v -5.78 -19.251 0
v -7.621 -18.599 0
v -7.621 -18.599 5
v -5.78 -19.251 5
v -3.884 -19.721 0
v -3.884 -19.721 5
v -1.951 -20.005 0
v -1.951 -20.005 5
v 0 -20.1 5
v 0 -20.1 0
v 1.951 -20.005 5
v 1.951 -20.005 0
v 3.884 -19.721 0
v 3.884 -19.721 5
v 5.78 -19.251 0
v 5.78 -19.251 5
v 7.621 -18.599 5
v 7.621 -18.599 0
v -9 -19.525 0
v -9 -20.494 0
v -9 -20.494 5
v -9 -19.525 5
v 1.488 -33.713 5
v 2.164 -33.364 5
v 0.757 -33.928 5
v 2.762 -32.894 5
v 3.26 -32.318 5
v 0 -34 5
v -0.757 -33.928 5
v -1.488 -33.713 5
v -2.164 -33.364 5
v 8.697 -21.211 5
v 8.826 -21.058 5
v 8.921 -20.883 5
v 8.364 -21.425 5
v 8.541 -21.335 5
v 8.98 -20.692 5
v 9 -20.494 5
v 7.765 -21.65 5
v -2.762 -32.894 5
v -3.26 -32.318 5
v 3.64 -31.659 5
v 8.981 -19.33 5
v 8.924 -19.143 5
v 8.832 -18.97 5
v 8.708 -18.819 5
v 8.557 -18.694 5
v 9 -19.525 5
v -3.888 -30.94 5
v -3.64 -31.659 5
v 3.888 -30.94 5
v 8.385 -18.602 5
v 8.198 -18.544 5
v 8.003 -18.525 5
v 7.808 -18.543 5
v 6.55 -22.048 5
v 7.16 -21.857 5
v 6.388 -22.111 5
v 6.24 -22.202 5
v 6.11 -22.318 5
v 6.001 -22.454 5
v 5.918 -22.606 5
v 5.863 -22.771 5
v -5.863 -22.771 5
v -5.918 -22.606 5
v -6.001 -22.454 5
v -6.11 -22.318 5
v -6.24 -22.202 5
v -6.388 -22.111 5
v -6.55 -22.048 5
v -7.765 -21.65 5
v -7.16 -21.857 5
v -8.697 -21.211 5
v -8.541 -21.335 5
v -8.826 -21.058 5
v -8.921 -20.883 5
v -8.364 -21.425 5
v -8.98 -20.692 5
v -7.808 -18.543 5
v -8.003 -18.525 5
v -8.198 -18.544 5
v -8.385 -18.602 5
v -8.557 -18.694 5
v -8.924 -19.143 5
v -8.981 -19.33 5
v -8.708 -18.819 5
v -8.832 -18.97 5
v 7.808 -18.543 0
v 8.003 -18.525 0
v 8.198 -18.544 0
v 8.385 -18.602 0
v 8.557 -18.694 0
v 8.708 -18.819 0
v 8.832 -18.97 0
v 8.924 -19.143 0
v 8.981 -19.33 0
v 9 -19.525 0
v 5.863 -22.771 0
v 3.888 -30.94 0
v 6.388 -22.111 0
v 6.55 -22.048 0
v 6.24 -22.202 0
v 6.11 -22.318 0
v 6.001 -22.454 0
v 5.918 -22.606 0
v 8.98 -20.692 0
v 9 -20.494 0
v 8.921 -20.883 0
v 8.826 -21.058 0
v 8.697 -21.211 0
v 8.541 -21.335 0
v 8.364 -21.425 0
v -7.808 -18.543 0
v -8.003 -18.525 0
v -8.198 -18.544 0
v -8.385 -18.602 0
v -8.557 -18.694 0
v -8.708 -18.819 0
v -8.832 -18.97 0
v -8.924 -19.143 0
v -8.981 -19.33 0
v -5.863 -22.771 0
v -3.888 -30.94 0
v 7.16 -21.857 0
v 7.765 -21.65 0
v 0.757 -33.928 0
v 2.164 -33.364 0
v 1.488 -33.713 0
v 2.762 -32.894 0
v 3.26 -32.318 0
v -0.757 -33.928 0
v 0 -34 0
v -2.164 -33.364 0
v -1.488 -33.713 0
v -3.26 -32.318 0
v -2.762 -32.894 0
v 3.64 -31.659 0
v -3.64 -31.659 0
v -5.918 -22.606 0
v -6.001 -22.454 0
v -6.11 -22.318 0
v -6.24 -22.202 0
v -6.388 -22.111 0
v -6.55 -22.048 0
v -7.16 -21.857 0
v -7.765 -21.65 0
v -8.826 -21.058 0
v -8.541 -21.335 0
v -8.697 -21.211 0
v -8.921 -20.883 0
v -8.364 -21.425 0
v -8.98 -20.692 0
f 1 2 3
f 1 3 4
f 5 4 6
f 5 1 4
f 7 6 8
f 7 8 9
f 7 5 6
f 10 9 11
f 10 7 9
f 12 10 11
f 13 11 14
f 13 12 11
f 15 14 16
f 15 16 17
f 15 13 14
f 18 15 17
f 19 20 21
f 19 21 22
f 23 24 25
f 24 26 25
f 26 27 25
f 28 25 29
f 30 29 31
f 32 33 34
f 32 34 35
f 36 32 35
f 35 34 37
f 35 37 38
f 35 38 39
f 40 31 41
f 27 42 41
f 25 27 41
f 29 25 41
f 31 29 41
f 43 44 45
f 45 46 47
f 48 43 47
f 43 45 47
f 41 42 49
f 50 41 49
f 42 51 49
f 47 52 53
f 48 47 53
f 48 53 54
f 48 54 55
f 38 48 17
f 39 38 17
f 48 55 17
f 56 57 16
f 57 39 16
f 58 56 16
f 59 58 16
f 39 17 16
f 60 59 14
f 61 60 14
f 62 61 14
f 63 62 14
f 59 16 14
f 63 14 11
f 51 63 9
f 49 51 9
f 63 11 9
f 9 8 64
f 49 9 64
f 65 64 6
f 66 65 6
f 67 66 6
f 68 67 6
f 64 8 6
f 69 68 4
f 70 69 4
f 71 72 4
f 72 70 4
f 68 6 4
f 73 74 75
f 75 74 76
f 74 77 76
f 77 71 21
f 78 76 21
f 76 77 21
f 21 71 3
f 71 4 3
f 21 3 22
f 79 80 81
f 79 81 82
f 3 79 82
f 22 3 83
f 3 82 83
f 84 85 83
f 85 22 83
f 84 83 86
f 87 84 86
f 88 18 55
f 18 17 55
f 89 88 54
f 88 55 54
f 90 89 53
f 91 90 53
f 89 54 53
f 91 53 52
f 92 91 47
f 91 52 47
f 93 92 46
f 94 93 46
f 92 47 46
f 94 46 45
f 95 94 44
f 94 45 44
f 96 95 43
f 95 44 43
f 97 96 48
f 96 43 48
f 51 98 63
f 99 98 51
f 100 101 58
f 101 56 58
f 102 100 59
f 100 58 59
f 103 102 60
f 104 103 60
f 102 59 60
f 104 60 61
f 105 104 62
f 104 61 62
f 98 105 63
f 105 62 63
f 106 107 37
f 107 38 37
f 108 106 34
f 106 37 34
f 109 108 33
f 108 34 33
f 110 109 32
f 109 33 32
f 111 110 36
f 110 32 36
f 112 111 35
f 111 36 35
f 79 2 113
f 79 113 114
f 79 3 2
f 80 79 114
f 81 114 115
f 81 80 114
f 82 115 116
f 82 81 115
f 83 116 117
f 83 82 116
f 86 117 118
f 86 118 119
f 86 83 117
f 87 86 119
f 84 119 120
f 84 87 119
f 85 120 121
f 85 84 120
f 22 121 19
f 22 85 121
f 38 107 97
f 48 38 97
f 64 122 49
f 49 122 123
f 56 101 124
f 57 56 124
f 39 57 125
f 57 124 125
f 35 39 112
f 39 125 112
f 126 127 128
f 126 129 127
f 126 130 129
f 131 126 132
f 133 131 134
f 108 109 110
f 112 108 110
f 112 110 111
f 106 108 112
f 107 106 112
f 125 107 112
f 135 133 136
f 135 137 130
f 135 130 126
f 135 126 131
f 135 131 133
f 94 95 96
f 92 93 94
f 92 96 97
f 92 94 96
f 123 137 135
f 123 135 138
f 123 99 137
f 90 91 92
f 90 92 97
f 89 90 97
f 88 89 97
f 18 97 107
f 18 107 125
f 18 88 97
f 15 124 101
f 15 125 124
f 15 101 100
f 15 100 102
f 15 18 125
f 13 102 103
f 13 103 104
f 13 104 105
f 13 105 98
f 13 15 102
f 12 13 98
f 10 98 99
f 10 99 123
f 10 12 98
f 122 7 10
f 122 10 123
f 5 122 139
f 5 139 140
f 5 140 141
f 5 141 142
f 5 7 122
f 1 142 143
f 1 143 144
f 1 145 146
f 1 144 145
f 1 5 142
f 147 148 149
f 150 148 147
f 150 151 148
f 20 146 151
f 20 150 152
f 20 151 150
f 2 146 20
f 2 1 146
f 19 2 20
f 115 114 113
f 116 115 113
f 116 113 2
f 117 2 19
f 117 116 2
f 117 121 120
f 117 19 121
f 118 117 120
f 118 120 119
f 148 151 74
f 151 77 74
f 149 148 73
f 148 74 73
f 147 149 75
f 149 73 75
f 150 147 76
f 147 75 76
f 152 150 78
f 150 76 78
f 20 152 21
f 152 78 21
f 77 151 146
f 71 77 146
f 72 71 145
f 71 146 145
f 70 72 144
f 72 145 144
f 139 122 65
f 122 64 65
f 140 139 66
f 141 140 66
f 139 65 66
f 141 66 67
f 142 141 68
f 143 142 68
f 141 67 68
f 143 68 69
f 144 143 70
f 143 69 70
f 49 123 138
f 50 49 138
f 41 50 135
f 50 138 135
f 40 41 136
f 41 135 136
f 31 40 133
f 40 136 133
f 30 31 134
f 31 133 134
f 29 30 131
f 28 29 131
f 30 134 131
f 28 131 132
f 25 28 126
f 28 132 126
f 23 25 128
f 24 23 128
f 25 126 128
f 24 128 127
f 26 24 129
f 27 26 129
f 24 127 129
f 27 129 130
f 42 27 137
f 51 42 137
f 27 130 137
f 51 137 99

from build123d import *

# Parameters (mm, degrees)
PAD_DEPTH = 5
FILLET_R  = 1


with BuildPart() as part:
    # Sketch → Pad (new body)
    with BuildSketch(Plane.XY):
        with BuildLine():
            ThreePointArc((-9, -17.972479), (0, -20.1), (9, -17.972479))
            Line((9, -21.16601), (9, -17.972479))
            ThreePointArc((6, -22.203603), (7.517922, -21.736625), (9, -21.16601))
            Line((6, -22.203603), (3.888006, -30.939897))
            ThreePointArc((-3.888006, -30.939897), (0, -34), (3.888006, -30.939897))
            Line((-6, -22.203603), (-3.888006, -30.939897))
            ThreePointArc((-9, -21.16601), (-7.517922, -21.736625), (-6, -22.203603))
            Line((-9, -21.16601), (-9, -17.972479))
        make_face()
    extrude(amount=PAD_DEPTH)

    # Fillet
    fillet_edges = [part.edges().sort_by_distance(p)[0] for p in [
        (9, -17.972479, 2.5),
        (9, -21.16601, 2.5),
        (-9, -21.16601, 2.5),
        (-6, -22.203603, 2.5),
        (-9, -17.972479, 2.5),
        (6, -22.203603, 2.5),
    ]]
    fillet(fillet_edges, radius=FILLET_R)


solid = part.part
